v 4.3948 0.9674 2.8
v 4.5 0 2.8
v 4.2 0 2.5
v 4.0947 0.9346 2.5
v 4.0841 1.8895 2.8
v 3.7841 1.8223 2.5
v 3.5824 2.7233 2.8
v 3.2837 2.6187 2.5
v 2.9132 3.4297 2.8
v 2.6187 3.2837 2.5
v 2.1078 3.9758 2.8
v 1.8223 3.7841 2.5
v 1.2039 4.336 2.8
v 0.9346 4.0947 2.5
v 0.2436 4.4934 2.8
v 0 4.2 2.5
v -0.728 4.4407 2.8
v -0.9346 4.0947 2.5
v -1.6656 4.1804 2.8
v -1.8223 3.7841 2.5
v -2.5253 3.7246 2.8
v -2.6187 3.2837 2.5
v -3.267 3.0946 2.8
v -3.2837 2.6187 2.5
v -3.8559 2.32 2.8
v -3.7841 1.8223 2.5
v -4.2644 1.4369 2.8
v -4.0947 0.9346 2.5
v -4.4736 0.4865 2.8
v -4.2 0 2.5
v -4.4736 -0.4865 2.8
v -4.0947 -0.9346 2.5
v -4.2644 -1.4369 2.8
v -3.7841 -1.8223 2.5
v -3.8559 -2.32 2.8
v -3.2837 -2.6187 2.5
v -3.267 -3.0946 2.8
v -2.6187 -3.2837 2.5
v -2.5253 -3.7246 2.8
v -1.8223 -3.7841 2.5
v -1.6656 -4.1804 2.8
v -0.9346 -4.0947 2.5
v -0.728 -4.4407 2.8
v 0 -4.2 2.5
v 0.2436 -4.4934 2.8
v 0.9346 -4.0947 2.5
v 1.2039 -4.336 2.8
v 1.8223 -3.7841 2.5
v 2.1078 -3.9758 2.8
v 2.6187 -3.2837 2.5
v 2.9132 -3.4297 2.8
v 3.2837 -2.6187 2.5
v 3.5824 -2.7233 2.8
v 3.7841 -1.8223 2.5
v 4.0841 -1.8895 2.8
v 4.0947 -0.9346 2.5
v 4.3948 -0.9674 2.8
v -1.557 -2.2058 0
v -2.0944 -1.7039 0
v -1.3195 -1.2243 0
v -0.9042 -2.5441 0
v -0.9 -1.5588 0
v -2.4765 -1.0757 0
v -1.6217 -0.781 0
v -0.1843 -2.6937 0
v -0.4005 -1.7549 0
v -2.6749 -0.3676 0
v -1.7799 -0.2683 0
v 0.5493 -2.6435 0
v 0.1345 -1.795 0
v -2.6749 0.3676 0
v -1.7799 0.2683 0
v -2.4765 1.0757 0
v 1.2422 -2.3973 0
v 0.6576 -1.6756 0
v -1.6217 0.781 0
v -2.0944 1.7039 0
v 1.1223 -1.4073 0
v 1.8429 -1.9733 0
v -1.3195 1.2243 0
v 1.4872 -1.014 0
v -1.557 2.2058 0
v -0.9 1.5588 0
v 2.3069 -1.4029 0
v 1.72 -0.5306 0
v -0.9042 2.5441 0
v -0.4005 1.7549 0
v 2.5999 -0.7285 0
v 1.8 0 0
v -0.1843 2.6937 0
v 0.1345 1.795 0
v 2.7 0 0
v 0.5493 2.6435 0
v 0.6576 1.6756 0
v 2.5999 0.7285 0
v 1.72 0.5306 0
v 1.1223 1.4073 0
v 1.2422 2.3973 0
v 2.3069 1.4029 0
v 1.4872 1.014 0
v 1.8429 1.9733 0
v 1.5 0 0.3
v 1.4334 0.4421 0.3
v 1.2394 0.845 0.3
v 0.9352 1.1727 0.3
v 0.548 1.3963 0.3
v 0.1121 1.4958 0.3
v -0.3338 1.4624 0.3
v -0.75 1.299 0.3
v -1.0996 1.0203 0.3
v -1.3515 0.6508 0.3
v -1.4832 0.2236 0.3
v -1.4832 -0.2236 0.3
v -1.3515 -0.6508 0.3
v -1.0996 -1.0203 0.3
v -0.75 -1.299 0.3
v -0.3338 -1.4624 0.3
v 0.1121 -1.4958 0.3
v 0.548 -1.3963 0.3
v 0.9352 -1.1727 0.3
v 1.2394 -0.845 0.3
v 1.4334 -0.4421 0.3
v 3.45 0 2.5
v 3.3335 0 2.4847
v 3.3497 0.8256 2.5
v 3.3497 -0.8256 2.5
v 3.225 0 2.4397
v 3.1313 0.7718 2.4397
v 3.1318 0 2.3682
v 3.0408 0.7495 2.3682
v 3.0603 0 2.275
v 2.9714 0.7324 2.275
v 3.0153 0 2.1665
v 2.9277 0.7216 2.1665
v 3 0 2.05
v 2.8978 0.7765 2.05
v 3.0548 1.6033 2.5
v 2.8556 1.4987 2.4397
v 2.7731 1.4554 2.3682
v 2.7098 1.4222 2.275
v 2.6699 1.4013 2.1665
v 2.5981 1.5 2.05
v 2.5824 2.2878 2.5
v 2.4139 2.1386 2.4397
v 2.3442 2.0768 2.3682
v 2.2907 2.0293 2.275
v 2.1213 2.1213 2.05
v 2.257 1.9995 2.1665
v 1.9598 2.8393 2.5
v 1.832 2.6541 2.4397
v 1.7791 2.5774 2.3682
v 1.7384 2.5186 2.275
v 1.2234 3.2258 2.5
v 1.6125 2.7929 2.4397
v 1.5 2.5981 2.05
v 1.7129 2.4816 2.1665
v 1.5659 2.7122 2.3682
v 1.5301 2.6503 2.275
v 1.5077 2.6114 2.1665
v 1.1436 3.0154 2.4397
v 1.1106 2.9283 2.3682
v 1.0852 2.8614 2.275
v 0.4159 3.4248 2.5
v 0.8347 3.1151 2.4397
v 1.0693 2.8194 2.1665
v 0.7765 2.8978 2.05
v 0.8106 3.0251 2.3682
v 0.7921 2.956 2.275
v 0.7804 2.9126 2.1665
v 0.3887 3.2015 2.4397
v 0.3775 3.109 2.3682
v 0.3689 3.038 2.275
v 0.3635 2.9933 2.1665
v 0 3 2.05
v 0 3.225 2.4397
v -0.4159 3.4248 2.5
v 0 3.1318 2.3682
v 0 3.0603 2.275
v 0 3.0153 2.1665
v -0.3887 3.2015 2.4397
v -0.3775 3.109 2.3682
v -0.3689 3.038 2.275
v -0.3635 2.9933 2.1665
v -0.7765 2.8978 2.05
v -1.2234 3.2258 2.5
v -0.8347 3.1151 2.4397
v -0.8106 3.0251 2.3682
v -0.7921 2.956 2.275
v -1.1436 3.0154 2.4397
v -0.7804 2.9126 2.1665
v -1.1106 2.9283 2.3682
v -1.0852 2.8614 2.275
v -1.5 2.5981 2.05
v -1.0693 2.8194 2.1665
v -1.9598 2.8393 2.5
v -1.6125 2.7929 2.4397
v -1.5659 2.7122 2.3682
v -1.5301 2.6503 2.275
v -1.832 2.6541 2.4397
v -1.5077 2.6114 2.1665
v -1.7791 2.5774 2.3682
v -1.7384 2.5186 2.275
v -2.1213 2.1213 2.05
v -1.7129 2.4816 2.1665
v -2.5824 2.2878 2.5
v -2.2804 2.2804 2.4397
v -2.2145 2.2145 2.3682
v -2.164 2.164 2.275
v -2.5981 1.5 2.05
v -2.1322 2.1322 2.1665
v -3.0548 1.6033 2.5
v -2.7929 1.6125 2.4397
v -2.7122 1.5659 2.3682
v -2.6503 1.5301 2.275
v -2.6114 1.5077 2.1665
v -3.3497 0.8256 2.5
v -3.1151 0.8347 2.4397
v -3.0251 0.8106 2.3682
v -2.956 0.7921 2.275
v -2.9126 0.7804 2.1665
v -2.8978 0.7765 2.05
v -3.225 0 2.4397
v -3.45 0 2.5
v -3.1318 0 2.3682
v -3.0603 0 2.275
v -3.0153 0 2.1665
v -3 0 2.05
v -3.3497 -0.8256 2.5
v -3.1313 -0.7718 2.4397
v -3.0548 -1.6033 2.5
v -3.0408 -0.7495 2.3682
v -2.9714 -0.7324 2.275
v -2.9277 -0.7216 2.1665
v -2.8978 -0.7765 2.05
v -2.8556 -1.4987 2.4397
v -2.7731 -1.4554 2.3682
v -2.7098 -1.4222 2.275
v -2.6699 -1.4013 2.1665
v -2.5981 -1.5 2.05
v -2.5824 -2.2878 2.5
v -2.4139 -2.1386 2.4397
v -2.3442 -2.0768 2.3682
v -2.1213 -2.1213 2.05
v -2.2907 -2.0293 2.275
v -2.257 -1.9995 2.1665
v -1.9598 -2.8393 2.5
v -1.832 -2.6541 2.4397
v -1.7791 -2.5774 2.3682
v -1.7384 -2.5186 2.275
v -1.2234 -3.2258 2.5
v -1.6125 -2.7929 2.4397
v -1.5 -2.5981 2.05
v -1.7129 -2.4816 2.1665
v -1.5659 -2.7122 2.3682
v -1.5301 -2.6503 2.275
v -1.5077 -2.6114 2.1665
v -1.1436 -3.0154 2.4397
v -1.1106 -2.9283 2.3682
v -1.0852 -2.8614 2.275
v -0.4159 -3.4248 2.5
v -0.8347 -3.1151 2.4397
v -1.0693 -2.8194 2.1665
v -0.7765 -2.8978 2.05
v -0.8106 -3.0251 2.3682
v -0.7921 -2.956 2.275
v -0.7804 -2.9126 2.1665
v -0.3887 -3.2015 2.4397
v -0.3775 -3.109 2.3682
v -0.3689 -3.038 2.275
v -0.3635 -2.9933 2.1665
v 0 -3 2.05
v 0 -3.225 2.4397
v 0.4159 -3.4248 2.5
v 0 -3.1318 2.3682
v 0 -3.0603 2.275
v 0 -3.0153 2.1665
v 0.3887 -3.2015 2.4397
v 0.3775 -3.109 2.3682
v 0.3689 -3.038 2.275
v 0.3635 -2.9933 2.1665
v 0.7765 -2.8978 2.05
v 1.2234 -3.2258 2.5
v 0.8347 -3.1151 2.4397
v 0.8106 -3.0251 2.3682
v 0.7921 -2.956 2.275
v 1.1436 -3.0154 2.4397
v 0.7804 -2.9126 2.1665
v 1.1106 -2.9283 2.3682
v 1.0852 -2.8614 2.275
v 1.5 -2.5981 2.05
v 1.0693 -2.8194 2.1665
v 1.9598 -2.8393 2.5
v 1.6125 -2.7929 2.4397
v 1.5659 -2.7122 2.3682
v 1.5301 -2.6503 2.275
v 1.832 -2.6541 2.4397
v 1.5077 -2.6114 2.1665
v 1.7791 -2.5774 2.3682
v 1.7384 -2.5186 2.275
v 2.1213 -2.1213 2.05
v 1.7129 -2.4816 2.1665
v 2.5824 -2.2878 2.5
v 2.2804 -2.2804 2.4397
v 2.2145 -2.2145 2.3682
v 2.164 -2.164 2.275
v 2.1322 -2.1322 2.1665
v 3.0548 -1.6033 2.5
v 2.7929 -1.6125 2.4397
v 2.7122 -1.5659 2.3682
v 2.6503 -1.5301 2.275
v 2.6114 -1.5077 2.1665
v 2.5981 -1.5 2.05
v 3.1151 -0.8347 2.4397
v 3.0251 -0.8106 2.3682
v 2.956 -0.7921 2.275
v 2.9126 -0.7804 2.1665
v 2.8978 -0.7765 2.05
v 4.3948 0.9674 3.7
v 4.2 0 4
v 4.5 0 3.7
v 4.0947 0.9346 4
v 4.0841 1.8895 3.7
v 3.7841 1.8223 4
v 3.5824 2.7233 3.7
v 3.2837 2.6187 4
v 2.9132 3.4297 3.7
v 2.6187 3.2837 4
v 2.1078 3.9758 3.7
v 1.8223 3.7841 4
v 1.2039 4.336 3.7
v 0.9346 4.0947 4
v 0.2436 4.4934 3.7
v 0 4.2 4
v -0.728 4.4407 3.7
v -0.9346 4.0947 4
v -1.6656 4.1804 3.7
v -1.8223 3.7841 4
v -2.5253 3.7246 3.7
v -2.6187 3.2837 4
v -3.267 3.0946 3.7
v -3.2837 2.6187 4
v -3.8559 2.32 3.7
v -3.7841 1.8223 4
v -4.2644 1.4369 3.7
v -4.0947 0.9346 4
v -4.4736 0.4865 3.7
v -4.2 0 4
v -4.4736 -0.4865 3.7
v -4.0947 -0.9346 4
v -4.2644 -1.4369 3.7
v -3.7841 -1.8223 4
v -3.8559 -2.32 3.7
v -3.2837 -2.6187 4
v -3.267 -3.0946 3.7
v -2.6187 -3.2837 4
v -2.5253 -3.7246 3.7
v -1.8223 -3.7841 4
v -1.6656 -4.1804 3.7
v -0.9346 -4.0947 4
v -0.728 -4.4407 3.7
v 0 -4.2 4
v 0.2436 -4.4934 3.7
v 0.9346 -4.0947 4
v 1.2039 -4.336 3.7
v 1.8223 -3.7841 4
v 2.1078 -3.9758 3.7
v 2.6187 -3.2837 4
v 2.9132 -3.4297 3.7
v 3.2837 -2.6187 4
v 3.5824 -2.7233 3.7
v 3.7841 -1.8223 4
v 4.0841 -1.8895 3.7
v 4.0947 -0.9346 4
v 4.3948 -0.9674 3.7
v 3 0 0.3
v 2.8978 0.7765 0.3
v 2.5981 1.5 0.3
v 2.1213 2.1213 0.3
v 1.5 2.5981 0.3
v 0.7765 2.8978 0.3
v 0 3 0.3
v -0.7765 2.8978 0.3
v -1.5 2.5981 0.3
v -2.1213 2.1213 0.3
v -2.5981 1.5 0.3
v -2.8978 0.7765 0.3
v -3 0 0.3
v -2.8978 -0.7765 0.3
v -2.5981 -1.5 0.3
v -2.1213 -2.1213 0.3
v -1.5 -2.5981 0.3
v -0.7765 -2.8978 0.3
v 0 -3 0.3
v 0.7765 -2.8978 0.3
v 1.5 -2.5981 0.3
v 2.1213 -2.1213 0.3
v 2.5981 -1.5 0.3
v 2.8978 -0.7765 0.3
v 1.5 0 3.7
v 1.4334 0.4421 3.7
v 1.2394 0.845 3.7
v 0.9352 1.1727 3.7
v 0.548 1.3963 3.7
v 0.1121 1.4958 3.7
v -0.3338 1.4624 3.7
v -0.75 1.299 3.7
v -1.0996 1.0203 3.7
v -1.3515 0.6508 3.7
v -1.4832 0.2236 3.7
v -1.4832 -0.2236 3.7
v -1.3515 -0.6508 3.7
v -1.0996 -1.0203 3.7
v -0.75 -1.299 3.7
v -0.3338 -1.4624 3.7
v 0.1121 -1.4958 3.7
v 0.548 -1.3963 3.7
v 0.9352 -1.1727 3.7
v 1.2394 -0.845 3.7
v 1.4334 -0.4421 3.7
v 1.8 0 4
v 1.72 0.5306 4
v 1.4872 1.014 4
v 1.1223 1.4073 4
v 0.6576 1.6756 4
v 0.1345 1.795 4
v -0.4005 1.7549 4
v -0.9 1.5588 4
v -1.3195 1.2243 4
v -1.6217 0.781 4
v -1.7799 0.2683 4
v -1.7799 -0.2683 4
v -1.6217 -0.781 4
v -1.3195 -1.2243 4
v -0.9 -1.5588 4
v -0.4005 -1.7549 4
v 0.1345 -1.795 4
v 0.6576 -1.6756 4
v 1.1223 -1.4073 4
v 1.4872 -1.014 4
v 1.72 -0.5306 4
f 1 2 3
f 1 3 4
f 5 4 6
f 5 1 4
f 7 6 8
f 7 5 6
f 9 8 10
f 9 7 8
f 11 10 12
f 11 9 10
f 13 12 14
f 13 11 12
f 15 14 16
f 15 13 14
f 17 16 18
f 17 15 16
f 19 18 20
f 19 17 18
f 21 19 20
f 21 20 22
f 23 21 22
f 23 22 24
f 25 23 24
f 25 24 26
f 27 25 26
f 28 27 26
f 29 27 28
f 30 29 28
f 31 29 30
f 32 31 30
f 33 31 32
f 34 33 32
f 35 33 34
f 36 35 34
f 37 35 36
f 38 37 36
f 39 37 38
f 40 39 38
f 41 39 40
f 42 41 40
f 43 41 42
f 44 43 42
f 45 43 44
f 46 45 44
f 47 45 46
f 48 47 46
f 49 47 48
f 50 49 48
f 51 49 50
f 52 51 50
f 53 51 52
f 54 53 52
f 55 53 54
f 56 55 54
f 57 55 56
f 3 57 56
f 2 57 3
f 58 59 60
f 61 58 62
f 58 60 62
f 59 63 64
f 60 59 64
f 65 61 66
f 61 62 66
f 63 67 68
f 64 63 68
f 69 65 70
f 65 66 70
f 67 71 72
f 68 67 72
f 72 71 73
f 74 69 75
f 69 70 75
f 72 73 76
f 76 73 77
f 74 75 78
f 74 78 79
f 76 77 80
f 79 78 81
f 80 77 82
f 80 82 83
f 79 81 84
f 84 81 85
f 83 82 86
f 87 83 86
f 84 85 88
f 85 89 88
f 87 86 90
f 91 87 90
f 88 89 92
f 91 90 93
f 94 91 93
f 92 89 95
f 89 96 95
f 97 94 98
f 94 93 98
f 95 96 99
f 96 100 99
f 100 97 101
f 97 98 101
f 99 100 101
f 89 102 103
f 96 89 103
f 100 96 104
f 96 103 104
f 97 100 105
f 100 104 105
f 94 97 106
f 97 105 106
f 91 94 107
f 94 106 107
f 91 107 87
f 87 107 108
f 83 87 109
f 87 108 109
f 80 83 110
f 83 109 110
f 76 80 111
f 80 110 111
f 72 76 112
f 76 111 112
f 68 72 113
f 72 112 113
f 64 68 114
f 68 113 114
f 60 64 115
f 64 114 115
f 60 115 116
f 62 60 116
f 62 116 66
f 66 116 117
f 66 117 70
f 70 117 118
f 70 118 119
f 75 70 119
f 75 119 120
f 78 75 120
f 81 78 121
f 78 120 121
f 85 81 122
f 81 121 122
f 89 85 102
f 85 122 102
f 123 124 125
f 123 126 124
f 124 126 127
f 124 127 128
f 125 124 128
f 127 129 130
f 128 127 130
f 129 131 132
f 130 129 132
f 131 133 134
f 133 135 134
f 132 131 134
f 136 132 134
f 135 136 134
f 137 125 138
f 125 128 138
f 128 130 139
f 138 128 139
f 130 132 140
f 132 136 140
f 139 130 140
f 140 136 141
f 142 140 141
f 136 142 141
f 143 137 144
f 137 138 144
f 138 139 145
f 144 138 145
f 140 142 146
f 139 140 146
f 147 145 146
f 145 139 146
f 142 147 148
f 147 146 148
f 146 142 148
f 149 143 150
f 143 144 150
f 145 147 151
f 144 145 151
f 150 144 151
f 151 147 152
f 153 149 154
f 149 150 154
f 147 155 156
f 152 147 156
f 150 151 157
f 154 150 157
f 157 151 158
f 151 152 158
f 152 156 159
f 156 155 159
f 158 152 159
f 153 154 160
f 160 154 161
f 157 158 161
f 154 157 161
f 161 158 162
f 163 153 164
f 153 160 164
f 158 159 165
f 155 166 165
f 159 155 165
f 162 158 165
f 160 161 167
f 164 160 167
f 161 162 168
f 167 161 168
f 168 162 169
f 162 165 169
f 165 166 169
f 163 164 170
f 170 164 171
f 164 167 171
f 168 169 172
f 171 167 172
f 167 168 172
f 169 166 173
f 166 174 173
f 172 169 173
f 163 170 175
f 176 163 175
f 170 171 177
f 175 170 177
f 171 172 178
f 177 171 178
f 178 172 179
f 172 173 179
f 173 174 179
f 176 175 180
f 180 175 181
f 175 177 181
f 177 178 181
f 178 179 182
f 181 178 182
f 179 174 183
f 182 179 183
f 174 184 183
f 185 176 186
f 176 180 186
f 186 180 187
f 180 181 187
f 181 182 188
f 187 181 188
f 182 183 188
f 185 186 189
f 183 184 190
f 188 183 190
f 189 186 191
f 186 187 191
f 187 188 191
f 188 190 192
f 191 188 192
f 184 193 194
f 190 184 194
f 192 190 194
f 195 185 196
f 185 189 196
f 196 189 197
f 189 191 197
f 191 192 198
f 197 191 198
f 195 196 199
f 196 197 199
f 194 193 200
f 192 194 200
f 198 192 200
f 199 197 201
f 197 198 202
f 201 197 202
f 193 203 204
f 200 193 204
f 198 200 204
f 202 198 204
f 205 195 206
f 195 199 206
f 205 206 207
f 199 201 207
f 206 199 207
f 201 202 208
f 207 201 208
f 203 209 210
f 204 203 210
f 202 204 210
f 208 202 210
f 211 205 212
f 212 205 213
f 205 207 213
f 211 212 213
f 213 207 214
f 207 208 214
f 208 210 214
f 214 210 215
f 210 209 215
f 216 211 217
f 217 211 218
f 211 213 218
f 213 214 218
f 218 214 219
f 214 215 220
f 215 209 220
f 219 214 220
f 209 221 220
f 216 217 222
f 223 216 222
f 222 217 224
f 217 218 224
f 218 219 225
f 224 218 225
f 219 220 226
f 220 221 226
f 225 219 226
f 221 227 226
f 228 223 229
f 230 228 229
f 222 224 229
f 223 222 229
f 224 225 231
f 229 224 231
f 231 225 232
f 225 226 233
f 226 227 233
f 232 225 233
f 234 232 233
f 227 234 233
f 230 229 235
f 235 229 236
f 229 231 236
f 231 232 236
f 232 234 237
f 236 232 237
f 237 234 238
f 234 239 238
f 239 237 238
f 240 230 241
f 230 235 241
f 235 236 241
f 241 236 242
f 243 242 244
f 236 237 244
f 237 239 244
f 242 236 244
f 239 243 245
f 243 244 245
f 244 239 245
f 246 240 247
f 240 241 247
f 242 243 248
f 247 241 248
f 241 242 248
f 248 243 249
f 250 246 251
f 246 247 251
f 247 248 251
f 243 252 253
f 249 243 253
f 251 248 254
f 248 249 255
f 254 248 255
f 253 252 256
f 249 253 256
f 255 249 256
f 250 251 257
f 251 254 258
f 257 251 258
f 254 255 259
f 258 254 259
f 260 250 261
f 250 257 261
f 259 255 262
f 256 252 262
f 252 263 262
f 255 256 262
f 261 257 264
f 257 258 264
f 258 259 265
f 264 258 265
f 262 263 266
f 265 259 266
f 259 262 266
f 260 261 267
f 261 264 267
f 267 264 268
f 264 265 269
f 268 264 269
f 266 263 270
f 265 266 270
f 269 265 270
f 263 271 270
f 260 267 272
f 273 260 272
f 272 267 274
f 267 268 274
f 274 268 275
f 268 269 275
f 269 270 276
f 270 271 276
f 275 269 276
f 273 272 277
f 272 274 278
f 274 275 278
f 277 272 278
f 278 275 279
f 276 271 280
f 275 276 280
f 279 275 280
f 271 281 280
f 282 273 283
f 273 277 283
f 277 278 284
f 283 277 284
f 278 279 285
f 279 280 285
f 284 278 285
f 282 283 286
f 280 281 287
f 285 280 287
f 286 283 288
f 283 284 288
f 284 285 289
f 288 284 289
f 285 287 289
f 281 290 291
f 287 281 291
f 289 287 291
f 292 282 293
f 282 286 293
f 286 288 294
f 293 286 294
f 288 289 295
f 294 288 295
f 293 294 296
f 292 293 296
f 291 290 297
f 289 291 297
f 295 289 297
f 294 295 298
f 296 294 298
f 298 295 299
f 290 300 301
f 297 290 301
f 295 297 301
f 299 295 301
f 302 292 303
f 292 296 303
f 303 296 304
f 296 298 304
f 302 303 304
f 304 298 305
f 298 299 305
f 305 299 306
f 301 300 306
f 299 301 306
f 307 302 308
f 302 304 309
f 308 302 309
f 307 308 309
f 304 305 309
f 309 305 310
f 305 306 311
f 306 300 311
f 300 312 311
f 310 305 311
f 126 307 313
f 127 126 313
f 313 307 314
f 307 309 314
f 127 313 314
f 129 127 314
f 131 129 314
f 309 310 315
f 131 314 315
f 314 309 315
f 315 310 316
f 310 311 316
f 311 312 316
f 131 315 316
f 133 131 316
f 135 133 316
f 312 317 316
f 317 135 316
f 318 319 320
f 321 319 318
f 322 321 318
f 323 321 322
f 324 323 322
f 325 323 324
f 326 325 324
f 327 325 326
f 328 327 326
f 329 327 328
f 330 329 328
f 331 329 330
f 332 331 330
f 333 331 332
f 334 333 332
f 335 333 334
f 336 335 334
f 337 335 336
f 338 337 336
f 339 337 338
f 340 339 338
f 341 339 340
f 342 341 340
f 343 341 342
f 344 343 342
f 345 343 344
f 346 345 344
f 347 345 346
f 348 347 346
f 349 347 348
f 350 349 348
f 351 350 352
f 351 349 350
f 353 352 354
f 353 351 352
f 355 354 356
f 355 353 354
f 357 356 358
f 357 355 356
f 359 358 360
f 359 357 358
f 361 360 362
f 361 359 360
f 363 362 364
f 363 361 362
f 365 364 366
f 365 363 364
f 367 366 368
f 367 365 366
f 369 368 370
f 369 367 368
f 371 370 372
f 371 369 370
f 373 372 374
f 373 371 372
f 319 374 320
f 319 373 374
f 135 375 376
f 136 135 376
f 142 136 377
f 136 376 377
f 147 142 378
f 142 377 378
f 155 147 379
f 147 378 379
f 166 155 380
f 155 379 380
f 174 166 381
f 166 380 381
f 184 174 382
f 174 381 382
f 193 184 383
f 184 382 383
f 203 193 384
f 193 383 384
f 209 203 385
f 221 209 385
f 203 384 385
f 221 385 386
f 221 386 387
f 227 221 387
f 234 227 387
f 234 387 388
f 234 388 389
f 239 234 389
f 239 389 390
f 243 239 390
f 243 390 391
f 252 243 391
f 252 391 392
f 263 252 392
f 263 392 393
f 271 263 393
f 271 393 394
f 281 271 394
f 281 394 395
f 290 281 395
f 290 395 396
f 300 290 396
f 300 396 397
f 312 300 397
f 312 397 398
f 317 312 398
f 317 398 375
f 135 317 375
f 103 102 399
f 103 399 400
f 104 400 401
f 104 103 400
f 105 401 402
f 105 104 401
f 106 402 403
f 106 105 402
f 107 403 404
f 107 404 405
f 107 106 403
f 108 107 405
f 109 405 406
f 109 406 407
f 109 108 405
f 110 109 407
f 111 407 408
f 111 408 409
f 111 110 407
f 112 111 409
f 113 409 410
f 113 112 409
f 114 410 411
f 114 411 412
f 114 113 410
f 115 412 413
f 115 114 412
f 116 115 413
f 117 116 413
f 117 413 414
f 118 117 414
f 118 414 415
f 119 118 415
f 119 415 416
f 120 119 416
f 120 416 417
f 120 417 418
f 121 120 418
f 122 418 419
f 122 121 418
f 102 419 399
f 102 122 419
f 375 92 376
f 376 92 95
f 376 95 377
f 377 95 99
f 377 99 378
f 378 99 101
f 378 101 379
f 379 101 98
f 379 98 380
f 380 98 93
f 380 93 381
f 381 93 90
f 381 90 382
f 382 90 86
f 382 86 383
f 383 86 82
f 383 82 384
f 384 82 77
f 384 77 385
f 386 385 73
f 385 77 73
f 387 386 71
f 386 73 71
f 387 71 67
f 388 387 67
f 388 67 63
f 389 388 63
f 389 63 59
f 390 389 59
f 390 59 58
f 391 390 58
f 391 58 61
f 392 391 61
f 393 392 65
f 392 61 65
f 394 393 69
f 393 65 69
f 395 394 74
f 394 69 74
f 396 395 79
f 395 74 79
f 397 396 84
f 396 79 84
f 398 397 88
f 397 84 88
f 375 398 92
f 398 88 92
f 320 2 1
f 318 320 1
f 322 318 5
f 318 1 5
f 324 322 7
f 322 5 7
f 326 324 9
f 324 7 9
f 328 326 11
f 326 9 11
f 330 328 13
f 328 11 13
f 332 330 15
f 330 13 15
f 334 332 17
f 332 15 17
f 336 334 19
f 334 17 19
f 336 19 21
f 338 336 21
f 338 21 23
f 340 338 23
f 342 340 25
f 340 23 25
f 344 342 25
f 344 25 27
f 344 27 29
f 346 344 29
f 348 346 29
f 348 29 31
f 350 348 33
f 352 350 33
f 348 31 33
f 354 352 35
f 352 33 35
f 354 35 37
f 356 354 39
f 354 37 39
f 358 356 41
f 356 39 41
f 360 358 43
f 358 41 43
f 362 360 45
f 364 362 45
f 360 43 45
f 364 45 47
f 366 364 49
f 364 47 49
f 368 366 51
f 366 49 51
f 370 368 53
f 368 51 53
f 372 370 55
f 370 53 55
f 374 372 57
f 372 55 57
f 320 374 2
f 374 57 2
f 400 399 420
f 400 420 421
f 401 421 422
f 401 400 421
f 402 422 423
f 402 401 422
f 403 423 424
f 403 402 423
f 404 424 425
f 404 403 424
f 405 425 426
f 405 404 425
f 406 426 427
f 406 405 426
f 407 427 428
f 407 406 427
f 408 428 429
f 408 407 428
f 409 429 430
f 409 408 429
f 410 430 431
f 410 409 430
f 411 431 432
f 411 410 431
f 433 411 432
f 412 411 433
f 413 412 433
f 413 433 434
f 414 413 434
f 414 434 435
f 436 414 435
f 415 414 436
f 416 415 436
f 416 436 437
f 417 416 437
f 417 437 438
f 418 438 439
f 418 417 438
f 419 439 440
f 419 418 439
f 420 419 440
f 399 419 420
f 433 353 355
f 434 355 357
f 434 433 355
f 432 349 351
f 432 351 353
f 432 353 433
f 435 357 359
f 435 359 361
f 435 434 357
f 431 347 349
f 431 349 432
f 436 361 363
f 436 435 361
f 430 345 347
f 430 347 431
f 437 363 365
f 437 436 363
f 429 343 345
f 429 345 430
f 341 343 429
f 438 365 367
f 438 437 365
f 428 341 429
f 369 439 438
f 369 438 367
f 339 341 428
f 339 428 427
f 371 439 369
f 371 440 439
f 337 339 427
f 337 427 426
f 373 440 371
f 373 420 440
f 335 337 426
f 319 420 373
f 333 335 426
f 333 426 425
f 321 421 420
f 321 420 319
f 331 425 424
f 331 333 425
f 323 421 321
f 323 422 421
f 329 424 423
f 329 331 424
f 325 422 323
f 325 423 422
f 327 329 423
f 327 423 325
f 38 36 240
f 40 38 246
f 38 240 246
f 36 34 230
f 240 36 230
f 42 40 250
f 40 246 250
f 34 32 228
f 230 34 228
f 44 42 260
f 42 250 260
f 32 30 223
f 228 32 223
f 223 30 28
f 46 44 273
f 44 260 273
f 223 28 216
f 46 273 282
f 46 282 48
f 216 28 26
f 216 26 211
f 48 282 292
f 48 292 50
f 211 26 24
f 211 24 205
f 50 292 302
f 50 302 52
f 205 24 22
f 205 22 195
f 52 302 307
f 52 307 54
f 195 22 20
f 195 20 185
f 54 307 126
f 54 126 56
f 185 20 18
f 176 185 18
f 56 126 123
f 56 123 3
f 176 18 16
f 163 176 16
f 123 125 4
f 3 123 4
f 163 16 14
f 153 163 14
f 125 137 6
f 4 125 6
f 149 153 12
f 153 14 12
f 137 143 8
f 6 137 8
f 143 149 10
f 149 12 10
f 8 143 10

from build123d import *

# Parameters (mm, degrees)
SKICA1_R        = 3
SKICA1_R_2      = 1.5
VYSUNOUT1_DEPTH = 4
VYSUNOUT2_START = -1.5
SKICA2_R        = 4.5
SKICA2_R_2      = 3
VYSUNOUT2_DEPTH = 1.5
ZAOBLIT1_R      = 0.45
ZKOSIT1_SIZE    = 0.3


with BuildPart() as part:
    # Skica1 → Vysunout1 (new body)
    with BuildSketch(Plane.XY):
        Circle(SKICA1_R)
        Circle(SKICA1_R_2, mode=Mode.SUBTRACT)
    extrude(amount=VYSUNOUT1_DEPTH)

    # Skica2 → Vysunout2 (add)
    with BuildSketch(Plane.XY.offset(4).offset(VYSUNOUT2_START)):
        Circle(SKICA2_R)
        Circle(SKICA2_R_2, mode=Mode.SUBTRACT)
    extrude(amount=VYSUNOUT2_DEPTH)

    # Zaoblit1
    zaoblit1_edges = [part.edges().sort_by_distance(p)[0] for p in [
        (-3, 0, 2.5),
    ]]
    fillet(zaoblit1_edges, radius=ZAOBLIT1_R)

    # Zkosit1
    zkosit1_edges = [part.edges().sort_by_distance(p)[0] for p in [
        (-4.5, 0, 2.5),
        (-4.5, 0, 4),
        (-3, 0, 0),
        (-1.5, 0, 0),
        (-1.5, 0, 4),
    ]]
    chamfer(zkosit1_edges, length=ZKOSIT1_SIZE)


solid = part.part
